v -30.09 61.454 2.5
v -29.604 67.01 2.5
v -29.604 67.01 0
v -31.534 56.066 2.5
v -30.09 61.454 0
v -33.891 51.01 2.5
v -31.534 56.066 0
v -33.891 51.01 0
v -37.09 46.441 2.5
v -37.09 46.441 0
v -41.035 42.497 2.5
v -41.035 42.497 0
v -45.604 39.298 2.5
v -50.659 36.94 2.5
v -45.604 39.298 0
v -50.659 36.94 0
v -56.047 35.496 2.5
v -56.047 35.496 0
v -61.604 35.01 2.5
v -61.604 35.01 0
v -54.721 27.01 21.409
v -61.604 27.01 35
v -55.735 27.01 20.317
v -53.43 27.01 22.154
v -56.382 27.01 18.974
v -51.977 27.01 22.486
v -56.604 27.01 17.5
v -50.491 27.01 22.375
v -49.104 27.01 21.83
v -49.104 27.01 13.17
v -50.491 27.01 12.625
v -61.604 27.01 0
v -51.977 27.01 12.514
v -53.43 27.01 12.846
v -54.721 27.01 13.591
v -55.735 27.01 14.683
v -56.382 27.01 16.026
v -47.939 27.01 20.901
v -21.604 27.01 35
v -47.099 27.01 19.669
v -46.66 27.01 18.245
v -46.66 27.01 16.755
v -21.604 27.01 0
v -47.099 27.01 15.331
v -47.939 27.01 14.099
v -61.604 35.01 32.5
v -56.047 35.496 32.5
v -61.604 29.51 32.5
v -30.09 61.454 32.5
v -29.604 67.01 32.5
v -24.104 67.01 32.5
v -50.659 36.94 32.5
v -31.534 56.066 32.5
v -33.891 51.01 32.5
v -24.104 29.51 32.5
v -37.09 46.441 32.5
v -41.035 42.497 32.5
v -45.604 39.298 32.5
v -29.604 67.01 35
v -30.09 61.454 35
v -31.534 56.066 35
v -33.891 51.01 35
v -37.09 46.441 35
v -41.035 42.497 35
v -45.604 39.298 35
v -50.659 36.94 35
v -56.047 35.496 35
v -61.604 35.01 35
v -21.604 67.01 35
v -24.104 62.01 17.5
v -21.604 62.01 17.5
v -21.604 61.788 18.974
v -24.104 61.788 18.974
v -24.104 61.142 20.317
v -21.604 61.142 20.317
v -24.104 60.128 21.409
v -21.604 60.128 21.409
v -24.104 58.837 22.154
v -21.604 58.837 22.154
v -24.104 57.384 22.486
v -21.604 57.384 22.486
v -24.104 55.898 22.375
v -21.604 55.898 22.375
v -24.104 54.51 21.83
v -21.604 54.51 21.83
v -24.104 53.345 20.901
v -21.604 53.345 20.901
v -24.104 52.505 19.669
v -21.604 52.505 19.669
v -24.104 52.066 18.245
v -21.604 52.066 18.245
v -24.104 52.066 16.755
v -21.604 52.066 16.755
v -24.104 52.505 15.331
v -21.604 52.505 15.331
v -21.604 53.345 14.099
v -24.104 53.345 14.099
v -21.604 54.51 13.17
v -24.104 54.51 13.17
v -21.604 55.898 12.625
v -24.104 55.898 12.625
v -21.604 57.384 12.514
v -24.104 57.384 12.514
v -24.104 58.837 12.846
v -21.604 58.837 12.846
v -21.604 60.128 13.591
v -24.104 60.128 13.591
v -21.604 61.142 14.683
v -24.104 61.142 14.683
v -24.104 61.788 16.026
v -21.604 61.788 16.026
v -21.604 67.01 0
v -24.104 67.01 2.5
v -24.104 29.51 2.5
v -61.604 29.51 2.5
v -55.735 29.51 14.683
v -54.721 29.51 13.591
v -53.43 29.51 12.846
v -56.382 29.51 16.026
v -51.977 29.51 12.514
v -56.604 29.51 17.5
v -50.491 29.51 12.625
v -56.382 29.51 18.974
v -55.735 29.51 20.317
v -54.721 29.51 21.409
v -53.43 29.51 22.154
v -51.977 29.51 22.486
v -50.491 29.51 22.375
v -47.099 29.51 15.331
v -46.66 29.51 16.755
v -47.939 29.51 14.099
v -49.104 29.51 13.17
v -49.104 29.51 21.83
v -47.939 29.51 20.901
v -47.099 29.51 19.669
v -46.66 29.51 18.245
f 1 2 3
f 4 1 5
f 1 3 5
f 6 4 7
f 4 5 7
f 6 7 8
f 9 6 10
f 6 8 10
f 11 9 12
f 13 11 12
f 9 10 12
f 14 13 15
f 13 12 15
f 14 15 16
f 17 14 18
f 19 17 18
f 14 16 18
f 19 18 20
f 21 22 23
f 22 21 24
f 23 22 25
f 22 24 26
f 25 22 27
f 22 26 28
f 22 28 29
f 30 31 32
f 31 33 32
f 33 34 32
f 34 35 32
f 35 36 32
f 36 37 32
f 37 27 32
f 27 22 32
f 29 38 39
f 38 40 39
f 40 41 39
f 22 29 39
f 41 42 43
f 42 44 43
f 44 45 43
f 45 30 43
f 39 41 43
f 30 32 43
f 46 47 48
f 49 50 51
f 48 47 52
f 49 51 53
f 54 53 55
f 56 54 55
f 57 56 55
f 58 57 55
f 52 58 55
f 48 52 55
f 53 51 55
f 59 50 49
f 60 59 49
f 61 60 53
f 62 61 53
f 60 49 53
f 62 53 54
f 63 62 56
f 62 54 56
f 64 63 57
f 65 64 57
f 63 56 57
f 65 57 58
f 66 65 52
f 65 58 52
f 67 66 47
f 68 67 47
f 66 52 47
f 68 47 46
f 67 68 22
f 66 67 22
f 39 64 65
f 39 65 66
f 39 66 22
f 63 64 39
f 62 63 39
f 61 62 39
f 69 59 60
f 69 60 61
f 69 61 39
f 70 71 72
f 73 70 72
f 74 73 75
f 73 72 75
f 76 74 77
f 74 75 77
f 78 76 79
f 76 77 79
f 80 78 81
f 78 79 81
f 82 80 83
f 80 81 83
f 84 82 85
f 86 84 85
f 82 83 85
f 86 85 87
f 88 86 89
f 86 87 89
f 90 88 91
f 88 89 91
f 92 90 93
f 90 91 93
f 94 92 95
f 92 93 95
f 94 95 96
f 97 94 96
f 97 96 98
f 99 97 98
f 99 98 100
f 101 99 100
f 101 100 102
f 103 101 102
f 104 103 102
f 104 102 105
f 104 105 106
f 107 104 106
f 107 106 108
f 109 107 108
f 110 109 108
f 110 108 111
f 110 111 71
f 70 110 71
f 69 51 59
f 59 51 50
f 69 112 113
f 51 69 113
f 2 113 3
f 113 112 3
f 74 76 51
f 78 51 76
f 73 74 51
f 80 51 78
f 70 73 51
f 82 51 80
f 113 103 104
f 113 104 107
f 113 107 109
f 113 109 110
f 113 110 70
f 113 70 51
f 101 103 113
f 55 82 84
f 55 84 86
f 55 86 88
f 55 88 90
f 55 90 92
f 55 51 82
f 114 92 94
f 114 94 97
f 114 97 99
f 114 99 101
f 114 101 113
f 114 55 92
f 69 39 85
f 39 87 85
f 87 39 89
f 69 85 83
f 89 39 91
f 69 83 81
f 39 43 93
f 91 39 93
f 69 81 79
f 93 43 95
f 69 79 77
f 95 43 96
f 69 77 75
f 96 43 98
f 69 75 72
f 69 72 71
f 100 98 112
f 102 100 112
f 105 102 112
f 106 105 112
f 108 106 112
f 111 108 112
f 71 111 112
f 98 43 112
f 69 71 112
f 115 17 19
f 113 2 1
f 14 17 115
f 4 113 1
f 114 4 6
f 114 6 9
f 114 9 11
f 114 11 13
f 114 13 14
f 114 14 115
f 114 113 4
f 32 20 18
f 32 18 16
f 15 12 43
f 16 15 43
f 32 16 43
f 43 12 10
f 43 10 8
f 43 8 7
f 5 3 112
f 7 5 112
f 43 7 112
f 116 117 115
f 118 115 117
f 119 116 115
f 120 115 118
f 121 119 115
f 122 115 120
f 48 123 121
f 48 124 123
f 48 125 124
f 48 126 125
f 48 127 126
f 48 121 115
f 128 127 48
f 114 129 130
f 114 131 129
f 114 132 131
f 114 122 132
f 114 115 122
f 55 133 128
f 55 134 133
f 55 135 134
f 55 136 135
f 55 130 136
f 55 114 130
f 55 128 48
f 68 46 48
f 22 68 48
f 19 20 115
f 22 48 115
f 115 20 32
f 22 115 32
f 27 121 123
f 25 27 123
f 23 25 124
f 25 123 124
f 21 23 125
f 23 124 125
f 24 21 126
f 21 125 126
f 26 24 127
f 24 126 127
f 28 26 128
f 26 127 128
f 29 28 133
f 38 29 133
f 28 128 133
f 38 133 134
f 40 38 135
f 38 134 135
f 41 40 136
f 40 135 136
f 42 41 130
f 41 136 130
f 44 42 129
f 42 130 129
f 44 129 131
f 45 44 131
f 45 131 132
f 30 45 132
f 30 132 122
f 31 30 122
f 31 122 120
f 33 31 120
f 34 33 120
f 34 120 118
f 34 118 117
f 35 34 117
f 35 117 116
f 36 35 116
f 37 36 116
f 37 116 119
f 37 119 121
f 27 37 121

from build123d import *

# Parameters (mm, degrees)
F1_DEPTH = 35
F2_T     = -2.5
F3_DEPTH = 25
F4_DEPTH = 25
F6_D     = 10
F8_D     = 10


with BuildPart() as f1:
    # F0 (on Top) → F1 (new body)
    with BuildSketch(Plane.XY):
        with BuildLine():
            Line((-21.6037747636, 67.0103192031), (-29.6037747636, 67.0103192031))
            ThreePointArc((-29.6037747636, 67.0103192031), (-38.9763577657, 44.3829022052), (-61.6037747636, 35.0103192031))
            Line((-61.6037747636, 35.0103192031), (-61.6037747636, 27.0103192031))
            Line((-61.6037747636, 27.0103192031), (-21.6037747636, 27.0103192031))
            Line((-21.6037747636, 27.0103192031), (-21.6037747636, 67.0103192031))
        make_face()
    extrude(amount=F1_DEPTH)

    # F2
    f2_openings = [f1.faces().sort_by_distance(p)[0] for p in [
        (-38.976358, 44.382902, 17.5),
    ]]
    offset(amount=F2_T, openings=f2_openings)

    # F3 (cut): a face of the model
    f3_faces = [f1.faces().sort_by_distance(p)[0] for p in [
        (-26.9026776227, 64.5103192031, 17.5),
    ]]
    extrude(f3_faces, amount=-F3_DEPTH, mode=Mode.SUBTRACT)

    # F4 (cut): a face of the model
    f4_faces = [f1.faces().sort_by_distance(p)[0] for p in [
        (-59.1037747636, 32.3092220622, 17.5),
    ]]
    extrude(f4_faces, amount=-F4_DEPTH, mode=Mode.SUBTRACT)

    # F6 (through all)
    with Locations(Plane(origin=(-24.1037747636, 0, 0), x_dir=(0, -1, 0), z_dir=(-1, 0, 0))):
        with Locations((-57.0103192031, 17.5)):
            Hole(F6_D / 2)

    # F8 (through all)
    with Locations(Plane.XZ.offset(-27.0103192031)):
        with Locations((-51.6037747636, 17.5)):
            Hole(F8_D / 2)


solid = f1.part
